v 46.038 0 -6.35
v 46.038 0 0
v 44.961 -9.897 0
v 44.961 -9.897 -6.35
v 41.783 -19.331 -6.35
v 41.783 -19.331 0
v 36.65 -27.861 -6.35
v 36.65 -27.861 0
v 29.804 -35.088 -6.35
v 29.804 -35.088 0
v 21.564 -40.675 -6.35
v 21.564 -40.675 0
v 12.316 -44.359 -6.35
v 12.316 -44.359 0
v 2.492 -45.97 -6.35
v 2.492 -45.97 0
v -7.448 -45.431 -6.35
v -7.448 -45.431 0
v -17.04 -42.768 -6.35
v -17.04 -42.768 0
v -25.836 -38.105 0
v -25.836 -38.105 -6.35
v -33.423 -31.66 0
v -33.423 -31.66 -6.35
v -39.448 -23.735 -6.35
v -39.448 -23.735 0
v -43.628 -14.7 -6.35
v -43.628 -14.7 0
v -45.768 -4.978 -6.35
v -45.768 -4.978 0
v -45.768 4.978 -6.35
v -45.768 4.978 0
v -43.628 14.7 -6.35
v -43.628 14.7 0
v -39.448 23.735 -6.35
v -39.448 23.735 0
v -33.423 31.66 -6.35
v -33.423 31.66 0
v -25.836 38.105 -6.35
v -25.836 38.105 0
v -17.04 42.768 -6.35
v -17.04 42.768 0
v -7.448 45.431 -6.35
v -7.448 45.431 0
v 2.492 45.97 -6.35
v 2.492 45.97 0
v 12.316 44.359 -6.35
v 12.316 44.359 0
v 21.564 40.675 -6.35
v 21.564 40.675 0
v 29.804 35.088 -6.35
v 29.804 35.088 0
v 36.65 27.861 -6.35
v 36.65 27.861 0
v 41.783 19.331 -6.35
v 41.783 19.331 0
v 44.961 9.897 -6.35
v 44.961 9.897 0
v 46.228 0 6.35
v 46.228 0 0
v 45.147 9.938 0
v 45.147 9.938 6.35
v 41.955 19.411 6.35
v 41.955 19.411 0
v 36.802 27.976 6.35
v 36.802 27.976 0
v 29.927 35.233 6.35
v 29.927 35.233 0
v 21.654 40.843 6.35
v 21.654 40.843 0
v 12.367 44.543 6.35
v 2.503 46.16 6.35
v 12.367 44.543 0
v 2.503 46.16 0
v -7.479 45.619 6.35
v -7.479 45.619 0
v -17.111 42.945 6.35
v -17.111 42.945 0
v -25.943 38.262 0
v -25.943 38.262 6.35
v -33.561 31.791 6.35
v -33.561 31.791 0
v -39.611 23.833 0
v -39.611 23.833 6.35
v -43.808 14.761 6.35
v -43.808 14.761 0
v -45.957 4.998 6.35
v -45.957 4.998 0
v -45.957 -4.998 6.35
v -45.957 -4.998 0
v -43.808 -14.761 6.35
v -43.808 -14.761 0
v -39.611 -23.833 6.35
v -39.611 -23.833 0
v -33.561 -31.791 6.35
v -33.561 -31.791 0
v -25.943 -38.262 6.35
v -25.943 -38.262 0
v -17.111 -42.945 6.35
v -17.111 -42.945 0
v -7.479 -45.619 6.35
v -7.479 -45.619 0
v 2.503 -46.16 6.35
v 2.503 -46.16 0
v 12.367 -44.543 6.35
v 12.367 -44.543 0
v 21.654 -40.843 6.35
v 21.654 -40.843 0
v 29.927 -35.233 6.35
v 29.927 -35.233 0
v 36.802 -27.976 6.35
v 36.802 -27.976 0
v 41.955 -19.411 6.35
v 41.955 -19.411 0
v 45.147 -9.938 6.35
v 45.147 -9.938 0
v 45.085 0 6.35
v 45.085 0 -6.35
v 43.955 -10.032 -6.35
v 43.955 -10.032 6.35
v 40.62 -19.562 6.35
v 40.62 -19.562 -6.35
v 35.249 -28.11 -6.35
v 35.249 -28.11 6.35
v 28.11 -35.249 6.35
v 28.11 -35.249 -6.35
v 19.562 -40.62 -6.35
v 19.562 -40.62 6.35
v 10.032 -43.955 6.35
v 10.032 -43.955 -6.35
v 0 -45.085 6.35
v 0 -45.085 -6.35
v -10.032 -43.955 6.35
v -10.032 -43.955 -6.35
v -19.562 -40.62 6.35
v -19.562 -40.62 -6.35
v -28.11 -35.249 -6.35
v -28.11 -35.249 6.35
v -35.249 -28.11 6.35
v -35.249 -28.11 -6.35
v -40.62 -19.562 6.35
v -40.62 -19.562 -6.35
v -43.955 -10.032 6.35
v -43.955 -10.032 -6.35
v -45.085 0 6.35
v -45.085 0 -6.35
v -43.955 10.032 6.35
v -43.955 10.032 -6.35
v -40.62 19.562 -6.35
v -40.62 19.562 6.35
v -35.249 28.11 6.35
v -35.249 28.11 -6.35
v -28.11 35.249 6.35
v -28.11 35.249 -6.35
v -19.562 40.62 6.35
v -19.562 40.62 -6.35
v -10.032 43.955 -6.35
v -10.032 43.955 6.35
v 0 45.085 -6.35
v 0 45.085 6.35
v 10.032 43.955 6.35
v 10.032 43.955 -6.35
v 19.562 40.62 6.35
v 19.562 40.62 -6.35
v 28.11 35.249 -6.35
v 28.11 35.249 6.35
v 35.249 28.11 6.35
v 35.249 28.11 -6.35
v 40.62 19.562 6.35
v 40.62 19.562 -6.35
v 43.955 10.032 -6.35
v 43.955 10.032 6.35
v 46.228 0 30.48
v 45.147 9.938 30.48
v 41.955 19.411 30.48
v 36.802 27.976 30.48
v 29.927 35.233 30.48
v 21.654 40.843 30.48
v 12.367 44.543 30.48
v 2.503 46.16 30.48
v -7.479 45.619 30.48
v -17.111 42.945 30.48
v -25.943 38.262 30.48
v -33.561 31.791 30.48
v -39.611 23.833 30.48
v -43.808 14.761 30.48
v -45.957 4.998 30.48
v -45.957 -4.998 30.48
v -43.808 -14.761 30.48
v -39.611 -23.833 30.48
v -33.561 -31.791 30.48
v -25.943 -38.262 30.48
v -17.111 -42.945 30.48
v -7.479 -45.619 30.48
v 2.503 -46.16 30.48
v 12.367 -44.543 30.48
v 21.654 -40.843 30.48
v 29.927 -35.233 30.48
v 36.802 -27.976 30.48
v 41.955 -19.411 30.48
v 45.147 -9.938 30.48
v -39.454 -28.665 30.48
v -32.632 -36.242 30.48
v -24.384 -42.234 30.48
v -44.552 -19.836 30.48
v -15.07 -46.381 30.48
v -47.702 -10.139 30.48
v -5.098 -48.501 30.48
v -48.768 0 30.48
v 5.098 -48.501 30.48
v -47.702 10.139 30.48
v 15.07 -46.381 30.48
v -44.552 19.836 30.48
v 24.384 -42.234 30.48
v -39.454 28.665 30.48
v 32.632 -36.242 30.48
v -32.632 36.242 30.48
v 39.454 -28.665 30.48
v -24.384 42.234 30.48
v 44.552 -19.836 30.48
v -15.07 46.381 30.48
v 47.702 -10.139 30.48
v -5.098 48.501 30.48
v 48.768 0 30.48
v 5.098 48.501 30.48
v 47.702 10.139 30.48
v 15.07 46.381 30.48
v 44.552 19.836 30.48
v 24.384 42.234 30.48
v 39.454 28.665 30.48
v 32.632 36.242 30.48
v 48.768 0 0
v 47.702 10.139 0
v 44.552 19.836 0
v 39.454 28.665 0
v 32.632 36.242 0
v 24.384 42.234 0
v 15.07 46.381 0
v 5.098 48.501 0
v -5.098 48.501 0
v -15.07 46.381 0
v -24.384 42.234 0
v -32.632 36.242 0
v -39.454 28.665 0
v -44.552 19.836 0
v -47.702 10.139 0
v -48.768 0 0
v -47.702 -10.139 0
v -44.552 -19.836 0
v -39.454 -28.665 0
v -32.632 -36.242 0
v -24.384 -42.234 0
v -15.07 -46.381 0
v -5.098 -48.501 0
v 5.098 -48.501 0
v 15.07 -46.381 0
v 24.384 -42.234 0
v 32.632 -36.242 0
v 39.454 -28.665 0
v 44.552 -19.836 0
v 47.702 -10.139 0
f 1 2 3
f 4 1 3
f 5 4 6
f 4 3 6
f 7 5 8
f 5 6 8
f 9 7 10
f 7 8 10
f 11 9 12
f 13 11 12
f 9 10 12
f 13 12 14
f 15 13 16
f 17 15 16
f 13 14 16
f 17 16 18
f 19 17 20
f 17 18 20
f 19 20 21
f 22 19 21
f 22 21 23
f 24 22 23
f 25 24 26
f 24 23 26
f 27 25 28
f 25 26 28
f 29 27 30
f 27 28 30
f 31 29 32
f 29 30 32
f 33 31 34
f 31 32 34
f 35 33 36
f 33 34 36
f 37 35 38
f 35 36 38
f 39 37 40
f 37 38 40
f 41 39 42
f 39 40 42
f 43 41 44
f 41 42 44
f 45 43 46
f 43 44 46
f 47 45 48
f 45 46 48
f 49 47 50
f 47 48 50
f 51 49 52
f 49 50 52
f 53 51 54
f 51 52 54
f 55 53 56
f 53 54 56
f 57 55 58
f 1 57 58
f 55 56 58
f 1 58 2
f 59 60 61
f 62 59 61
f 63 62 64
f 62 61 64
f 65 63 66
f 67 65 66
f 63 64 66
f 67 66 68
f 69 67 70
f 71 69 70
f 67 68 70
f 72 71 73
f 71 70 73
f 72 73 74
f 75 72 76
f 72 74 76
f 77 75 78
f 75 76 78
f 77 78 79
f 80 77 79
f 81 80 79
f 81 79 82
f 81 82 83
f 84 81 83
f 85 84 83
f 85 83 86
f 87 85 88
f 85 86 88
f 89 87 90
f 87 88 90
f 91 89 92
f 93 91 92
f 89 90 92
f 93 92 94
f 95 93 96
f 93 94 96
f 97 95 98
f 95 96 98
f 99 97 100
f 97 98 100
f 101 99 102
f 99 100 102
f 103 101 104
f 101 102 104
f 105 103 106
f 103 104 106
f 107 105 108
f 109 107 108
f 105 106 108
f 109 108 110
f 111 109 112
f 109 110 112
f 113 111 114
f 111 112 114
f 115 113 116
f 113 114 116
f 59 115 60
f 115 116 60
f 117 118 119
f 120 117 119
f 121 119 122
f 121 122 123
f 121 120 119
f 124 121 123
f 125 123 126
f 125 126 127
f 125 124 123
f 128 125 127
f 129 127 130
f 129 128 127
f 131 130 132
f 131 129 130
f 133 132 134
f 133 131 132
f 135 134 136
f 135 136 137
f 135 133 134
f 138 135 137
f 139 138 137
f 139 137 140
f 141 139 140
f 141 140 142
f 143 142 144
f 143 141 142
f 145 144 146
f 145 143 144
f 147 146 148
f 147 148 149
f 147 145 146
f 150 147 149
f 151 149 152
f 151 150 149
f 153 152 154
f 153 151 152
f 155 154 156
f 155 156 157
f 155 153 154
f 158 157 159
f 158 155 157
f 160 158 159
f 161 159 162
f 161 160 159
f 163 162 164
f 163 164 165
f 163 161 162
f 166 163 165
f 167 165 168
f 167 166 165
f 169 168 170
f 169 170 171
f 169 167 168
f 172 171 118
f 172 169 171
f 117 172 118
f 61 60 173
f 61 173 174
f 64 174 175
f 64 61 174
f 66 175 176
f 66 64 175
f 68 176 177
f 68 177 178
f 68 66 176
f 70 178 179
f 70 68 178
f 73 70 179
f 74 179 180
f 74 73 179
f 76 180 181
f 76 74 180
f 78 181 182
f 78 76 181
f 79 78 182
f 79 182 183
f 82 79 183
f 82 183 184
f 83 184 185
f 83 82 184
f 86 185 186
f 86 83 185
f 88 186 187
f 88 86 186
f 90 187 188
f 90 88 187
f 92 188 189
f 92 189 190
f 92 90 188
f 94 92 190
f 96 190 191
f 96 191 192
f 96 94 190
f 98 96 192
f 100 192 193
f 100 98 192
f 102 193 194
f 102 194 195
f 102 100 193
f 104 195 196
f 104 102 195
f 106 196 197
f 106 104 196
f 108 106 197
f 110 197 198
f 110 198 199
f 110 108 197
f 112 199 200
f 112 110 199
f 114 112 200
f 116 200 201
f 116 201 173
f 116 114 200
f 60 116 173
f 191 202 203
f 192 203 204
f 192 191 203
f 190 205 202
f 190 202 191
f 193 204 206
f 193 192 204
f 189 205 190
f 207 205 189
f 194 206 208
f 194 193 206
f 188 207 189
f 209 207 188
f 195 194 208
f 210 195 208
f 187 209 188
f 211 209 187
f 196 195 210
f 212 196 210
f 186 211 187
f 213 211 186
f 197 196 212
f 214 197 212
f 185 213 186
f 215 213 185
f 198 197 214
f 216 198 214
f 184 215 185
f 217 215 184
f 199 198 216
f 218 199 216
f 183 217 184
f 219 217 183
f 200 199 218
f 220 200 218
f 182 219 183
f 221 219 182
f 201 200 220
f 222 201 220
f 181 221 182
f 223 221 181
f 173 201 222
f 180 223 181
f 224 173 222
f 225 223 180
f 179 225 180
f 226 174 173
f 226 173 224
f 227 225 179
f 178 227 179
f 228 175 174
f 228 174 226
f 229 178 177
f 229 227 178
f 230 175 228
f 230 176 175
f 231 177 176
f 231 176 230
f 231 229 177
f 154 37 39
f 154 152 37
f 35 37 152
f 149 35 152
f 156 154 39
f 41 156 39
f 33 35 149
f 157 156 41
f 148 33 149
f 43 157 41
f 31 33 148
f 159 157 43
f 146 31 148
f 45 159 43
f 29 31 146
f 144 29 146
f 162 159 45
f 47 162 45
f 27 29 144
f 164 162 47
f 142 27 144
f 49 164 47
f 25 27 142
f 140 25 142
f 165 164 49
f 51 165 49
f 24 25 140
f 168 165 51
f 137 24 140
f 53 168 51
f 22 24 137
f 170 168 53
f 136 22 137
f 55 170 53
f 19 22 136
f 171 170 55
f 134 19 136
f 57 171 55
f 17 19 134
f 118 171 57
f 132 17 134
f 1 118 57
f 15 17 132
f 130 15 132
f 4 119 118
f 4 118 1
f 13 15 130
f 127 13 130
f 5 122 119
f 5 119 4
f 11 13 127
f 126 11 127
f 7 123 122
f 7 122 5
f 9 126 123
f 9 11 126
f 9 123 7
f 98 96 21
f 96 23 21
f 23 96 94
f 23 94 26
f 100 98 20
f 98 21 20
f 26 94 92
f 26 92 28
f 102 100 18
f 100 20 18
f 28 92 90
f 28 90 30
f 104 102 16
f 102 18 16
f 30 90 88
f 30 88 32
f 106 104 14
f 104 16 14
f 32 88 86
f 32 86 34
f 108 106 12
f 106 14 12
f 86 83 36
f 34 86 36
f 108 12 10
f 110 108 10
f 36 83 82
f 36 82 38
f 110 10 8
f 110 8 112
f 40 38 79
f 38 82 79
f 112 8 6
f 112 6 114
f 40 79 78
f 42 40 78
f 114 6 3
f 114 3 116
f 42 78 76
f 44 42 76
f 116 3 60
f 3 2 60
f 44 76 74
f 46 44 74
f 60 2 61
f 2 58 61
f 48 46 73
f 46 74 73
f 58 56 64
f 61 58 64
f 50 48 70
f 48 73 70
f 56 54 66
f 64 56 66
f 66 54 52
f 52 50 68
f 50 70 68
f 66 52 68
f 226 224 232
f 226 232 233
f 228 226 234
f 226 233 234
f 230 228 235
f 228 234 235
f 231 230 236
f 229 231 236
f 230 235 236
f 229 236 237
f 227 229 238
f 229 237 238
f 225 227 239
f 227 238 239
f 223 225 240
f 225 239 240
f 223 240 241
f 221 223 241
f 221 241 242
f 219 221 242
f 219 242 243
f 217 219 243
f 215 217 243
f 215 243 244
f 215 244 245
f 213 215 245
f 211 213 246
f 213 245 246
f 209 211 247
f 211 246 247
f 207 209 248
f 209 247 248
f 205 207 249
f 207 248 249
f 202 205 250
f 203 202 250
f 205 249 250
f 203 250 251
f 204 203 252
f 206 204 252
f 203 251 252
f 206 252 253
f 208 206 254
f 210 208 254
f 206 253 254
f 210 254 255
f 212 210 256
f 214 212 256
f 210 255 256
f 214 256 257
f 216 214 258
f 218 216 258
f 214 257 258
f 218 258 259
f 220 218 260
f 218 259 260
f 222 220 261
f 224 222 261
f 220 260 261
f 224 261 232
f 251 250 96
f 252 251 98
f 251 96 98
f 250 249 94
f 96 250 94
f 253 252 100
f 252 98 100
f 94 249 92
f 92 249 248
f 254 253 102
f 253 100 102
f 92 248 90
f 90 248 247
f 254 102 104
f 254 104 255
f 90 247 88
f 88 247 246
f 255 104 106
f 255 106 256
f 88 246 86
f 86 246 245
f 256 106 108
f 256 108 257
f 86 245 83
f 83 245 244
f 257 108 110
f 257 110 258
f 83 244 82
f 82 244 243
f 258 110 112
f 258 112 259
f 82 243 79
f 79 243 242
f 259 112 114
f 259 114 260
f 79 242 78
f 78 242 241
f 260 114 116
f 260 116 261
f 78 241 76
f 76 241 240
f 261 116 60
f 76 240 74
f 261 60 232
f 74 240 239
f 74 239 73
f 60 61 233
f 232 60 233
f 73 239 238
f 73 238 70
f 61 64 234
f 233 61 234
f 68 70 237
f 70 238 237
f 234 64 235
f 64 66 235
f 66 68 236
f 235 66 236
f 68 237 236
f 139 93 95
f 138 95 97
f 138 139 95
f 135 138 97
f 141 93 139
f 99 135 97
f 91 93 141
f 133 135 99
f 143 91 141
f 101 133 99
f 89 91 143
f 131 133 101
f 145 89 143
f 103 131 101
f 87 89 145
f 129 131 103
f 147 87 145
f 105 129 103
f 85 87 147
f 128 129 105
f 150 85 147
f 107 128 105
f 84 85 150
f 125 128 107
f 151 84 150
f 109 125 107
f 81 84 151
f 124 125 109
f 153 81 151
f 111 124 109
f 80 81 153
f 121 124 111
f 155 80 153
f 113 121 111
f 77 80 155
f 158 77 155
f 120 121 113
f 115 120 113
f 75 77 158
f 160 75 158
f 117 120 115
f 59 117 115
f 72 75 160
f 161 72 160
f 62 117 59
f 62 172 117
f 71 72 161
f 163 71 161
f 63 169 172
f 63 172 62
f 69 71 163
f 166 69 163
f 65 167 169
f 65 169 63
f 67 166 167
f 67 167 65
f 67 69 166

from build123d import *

# Parameters (mm, degrees)
F0_R     = 48.768
F0_R_2   = 46.228
F1_DEPTH = 30.48
F2_R     = 46.228
F2_R_2   = 45.085
F3_DEPTH = 6.35
F4_R     = 46.0375
F4_R_2   = 45.085
F5_DEPTH = 6.35


with BuildPart() as f1:
    # F0 (on Top) → F1 (new body)
    with BuildSketch(Plane.XY):
        Circle(F0_R)
        Circle(F0_R_2, mode=Mode.SUBTRACT)
    extrude(amount=F1_DEPTH)


with BuildPart() as f3:
    # F2 (on Top) → F3 (new body)
    with BuildSketch(Plane.XY):
        Circle(F2_R)
        Circle(F2_R_2, mode=Mode.SUBTRACT)
    extrude(amount=F3_DEPTH)

    # F4 (on face) → F5 (join)
    with BuildSketch(Plane(origin=(0, 0, 0), x_dir=(1, 0, 0), z_dir=(0, 0, -1))):
        Circle(F4_R)
        Circle(F4_R_2, mode=Mode.SUBTRACT)
    extrude(amount=F5_DEPTH)


solid = Compound([f1.part, f3.part])
